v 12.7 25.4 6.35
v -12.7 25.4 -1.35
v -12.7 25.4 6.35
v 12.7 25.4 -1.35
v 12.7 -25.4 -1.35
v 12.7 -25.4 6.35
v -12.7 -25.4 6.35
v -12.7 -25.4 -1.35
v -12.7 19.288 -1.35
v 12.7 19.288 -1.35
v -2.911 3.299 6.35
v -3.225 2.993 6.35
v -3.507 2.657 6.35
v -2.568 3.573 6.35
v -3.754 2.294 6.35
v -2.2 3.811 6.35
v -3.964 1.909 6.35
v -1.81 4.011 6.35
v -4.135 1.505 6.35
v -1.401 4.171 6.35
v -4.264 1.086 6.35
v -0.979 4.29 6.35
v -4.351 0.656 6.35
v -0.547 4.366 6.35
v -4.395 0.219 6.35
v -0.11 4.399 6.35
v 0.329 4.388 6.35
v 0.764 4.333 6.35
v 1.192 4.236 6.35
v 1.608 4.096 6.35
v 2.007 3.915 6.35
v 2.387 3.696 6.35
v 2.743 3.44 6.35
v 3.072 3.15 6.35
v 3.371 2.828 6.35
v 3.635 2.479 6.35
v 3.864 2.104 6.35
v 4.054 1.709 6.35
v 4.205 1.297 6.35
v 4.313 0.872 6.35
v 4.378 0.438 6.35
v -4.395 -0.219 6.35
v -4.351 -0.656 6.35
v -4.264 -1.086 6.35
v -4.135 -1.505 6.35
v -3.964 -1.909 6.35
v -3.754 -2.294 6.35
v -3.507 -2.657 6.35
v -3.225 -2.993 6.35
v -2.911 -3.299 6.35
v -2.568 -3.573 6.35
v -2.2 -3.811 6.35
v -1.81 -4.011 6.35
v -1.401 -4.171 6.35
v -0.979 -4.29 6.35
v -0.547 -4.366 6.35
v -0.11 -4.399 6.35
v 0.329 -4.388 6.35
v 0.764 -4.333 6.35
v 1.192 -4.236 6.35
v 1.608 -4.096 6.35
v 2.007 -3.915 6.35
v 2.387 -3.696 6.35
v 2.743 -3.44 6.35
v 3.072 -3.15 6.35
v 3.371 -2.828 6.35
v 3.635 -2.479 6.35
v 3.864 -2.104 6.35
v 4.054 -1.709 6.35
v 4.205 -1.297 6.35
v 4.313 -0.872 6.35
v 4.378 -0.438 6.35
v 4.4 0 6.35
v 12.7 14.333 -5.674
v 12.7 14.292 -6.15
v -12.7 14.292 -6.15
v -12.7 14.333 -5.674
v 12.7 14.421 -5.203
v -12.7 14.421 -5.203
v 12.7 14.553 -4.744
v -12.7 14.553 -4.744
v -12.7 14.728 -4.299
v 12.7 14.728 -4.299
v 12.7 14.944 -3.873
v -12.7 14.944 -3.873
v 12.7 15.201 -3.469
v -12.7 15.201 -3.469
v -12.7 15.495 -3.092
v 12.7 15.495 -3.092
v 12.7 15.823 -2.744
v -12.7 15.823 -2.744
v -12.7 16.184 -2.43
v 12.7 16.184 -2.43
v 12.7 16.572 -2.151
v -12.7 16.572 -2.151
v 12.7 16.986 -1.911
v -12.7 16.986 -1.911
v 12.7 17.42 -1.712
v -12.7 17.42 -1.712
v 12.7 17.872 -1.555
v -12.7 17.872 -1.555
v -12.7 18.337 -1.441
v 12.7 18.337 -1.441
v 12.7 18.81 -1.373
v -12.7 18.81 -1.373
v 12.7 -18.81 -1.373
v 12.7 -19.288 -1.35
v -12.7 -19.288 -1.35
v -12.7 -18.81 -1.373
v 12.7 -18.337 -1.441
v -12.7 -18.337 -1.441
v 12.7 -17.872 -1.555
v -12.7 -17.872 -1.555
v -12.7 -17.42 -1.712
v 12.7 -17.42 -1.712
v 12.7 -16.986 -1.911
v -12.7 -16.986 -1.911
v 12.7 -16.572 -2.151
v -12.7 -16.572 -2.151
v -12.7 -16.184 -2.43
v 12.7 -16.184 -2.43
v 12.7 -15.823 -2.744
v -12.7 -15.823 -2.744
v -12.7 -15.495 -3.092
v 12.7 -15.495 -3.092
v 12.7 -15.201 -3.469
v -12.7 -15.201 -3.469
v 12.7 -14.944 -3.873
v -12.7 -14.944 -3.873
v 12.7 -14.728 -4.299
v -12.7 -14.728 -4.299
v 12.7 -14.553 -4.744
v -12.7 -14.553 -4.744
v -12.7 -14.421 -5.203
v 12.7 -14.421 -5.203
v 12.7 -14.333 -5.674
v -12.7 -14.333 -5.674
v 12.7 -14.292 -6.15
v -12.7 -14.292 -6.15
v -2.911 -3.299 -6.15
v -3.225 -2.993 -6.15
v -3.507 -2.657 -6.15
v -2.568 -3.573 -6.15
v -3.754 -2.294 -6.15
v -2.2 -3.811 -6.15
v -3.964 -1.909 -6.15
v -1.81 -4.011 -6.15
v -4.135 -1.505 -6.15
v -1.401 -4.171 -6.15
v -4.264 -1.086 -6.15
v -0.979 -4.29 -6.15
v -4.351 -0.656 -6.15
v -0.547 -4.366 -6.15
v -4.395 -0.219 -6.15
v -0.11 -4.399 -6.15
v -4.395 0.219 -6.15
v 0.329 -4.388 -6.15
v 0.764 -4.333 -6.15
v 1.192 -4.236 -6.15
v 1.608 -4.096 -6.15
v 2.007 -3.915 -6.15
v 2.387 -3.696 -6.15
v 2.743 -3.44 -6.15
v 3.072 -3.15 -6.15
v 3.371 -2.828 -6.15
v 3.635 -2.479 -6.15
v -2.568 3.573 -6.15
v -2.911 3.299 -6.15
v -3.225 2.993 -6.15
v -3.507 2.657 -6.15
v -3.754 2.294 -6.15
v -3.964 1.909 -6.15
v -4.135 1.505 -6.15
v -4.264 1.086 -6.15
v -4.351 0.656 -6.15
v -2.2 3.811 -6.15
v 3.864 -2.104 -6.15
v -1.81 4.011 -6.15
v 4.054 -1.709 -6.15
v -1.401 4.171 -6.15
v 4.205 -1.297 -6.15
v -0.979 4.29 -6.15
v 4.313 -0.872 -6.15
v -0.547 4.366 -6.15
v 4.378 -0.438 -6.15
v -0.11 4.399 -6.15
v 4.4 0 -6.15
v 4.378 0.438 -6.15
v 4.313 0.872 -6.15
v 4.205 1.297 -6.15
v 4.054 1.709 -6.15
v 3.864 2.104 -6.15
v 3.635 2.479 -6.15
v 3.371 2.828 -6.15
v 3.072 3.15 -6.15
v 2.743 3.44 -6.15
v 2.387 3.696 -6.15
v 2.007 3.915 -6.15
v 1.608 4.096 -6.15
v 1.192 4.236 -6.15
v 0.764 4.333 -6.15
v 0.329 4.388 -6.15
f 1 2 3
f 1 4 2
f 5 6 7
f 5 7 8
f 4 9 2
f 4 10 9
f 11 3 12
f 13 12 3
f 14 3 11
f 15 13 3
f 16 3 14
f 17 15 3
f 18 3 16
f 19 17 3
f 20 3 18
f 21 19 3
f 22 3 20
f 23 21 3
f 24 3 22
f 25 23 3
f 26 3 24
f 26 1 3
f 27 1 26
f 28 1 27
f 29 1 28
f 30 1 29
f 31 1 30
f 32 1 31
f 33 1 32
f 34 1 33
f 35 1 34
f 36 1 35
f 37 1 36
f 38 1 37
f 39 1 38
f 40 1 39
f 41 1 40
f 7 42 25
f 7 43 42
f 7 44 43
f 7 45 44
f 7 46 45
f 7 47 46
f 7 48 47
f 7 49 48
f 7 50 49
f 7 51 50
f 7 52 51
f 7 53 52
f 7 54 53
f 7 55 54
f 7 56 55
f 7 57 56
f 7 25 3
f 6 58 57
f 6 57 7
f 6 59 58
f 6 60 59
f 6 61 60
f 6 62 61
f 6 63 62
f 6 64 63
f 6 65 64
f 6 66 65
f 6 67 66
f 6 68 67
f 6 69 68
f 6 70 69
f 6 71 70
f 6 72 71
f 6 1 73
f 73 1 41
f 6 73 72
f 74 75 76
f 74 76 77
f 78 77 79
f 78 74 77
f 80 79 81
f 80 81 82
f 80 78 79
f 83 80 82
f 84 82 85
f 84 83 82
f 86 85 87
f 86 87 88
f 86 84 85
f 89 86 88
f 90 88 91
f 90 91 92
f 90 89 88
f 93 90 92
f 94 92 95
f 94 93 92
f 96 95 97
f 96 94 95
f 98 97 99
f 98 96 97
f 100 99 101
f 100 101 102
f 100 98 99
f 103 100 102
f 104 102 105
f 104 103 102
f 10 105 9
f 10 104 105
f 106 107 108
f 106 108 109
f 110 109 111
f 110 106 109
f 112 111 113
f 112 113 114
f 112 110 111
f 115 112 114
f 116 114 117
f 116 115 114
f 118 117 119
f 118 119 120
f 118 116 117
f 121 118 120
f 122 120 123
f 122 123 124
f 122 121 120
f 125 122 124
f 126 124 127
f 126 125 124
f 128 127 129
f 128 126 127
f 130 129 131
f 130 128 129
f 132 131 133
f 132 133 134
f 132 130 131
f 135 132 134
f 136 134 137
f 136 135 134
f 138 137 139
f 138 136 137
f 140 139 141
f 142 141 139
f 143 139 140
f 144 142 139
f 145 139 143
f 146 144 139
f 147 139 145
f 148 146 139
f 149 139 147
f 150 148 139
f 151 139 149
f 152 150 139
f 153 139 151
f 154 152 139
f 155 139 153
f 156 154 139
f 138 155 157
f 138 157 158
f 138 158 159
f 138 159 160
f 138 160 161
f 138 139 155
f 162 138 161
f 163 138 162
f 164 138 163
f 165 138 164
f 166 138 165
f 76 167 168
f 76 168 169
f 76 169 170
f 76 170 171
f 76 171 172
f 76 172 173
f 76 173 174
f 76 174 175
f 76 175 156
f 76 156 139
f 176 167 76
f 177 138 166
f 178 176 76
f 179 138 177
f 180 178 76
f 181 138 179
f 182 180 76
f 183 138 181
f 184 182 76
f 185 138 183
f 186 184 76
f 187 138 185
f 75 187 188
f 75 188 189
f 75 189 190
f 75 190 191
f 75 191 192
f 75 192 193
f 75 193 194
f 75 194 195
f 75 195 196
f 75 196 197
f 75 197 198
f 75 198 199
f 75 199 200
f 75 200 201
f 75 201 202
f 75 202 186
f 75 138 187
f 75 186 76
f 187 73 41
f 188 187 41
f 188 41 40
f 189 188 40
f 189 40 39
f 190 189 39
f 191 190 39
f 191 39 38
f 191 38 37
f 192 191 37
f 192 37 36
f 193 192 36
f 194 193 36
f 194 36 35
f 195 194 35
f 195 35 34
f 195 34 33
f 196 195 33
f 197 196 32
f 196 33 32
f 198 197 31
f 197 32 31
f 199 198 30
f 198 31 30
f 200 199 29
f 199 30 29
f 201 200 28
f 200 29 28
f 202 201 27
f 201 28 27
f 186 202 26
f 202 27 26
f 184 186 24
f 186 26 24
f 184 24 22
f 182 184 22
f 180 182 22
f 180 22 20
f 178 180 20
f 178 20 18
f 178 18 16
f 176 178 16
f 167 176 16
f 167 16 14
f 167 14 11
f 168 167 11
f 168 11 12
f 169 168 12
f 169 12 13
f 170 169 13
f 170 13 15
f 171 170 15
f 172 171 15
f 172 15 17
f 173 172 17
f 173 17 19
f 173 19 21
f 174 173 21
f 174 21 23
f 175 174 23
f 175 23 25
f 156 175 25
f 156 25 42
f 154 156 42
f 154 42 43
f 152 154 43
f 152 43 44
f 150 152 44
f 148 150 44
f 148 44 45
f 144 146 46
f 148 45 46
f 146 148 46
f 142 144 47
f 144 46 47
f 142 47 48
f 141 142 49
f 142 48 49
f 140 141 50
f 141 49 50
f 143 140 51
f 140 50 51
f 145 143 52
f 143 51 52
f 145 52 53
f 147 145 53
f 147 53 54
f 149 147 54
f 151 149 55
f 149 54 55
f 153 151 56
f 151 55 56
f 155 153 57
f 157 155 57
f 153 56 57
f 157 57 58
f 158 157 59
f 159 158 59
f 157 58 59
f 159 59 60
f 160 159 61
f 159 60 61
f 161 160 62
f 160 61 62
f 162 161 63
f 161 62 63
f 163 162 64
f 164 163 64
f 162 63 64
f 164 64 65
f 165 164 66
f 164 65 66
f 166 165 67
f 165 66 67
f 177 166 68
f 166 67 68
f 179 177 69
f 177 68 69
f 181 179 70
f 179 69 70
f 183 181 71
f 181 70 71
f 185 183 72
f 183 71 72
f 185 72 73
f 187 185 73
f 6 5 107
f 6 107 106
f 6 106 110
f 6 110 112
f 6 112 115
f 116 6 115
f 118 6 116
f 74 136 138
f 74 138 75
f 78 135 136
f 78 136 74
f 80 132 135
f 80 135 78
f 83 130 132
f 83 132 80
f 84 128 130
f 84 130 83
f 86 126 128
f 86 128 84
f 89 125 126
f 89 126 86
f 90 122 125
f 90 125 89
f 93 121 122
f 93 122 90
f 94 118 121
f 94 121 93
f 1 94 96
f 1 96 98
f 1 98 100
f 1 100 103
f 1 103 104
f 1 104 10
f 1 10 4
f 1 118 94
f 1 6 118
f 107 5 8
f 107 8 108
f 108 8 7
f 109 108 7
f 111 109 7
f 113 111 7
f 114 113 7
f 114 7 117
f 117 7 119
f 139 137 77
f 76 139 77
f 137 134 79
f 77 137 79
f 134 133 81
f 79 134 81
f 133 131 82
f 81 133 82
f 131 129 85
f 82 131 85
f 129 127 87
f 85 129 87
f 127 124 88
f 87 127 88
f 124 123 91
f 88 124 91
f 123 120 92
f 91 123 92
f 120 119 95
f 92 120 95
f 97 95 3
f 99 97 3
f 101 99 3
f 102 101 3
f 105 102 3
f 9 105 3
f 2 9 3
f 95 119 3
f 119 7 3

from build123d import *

# Parameters (mm, degrees)
F1_DEPTH = 12.7
F2_R     = 4.4
F3_DEPTH = 25


with BuildPart() as f1:
    # F0 (on Right) → F1 (new body, symmetric)
    with BuildSketch(Plane.YZ):
        with BuildLine():
            Line((25.4, 6.35), (-25.4, 6.35))
            Line((-25.4, 6.35), (-25.4, -1.35))
            Line((-25.4, -1.35), (-19.2875, -1.35))
            ThreePointArc((-19.2875, -1.35), (-15.823398, -2.744449), (-14.291502, -6.15))
            Line((-14.291502, -6.15), (14.291502, -6.15))
            ThreePointArc((14.291502, -6.15), (15.823398, -2.744449), (19.2875, -1.35))
            Line((19.2875, -1.35), (25.4, -1.35))
            Line((25.4, -1.35), (25.4, 6.35))
        make_face()
    extrude(amount=F1_DEPTH, both=True)

    # F2 (on face) → F3 (cut)
    with BuildSketch(Plane.XY.offset(6.35)):
        Circle(F2_R)
    extrude(amount=-F3_DEPTH, mode=Mode.SUBTRACT)


solid = f1.part
